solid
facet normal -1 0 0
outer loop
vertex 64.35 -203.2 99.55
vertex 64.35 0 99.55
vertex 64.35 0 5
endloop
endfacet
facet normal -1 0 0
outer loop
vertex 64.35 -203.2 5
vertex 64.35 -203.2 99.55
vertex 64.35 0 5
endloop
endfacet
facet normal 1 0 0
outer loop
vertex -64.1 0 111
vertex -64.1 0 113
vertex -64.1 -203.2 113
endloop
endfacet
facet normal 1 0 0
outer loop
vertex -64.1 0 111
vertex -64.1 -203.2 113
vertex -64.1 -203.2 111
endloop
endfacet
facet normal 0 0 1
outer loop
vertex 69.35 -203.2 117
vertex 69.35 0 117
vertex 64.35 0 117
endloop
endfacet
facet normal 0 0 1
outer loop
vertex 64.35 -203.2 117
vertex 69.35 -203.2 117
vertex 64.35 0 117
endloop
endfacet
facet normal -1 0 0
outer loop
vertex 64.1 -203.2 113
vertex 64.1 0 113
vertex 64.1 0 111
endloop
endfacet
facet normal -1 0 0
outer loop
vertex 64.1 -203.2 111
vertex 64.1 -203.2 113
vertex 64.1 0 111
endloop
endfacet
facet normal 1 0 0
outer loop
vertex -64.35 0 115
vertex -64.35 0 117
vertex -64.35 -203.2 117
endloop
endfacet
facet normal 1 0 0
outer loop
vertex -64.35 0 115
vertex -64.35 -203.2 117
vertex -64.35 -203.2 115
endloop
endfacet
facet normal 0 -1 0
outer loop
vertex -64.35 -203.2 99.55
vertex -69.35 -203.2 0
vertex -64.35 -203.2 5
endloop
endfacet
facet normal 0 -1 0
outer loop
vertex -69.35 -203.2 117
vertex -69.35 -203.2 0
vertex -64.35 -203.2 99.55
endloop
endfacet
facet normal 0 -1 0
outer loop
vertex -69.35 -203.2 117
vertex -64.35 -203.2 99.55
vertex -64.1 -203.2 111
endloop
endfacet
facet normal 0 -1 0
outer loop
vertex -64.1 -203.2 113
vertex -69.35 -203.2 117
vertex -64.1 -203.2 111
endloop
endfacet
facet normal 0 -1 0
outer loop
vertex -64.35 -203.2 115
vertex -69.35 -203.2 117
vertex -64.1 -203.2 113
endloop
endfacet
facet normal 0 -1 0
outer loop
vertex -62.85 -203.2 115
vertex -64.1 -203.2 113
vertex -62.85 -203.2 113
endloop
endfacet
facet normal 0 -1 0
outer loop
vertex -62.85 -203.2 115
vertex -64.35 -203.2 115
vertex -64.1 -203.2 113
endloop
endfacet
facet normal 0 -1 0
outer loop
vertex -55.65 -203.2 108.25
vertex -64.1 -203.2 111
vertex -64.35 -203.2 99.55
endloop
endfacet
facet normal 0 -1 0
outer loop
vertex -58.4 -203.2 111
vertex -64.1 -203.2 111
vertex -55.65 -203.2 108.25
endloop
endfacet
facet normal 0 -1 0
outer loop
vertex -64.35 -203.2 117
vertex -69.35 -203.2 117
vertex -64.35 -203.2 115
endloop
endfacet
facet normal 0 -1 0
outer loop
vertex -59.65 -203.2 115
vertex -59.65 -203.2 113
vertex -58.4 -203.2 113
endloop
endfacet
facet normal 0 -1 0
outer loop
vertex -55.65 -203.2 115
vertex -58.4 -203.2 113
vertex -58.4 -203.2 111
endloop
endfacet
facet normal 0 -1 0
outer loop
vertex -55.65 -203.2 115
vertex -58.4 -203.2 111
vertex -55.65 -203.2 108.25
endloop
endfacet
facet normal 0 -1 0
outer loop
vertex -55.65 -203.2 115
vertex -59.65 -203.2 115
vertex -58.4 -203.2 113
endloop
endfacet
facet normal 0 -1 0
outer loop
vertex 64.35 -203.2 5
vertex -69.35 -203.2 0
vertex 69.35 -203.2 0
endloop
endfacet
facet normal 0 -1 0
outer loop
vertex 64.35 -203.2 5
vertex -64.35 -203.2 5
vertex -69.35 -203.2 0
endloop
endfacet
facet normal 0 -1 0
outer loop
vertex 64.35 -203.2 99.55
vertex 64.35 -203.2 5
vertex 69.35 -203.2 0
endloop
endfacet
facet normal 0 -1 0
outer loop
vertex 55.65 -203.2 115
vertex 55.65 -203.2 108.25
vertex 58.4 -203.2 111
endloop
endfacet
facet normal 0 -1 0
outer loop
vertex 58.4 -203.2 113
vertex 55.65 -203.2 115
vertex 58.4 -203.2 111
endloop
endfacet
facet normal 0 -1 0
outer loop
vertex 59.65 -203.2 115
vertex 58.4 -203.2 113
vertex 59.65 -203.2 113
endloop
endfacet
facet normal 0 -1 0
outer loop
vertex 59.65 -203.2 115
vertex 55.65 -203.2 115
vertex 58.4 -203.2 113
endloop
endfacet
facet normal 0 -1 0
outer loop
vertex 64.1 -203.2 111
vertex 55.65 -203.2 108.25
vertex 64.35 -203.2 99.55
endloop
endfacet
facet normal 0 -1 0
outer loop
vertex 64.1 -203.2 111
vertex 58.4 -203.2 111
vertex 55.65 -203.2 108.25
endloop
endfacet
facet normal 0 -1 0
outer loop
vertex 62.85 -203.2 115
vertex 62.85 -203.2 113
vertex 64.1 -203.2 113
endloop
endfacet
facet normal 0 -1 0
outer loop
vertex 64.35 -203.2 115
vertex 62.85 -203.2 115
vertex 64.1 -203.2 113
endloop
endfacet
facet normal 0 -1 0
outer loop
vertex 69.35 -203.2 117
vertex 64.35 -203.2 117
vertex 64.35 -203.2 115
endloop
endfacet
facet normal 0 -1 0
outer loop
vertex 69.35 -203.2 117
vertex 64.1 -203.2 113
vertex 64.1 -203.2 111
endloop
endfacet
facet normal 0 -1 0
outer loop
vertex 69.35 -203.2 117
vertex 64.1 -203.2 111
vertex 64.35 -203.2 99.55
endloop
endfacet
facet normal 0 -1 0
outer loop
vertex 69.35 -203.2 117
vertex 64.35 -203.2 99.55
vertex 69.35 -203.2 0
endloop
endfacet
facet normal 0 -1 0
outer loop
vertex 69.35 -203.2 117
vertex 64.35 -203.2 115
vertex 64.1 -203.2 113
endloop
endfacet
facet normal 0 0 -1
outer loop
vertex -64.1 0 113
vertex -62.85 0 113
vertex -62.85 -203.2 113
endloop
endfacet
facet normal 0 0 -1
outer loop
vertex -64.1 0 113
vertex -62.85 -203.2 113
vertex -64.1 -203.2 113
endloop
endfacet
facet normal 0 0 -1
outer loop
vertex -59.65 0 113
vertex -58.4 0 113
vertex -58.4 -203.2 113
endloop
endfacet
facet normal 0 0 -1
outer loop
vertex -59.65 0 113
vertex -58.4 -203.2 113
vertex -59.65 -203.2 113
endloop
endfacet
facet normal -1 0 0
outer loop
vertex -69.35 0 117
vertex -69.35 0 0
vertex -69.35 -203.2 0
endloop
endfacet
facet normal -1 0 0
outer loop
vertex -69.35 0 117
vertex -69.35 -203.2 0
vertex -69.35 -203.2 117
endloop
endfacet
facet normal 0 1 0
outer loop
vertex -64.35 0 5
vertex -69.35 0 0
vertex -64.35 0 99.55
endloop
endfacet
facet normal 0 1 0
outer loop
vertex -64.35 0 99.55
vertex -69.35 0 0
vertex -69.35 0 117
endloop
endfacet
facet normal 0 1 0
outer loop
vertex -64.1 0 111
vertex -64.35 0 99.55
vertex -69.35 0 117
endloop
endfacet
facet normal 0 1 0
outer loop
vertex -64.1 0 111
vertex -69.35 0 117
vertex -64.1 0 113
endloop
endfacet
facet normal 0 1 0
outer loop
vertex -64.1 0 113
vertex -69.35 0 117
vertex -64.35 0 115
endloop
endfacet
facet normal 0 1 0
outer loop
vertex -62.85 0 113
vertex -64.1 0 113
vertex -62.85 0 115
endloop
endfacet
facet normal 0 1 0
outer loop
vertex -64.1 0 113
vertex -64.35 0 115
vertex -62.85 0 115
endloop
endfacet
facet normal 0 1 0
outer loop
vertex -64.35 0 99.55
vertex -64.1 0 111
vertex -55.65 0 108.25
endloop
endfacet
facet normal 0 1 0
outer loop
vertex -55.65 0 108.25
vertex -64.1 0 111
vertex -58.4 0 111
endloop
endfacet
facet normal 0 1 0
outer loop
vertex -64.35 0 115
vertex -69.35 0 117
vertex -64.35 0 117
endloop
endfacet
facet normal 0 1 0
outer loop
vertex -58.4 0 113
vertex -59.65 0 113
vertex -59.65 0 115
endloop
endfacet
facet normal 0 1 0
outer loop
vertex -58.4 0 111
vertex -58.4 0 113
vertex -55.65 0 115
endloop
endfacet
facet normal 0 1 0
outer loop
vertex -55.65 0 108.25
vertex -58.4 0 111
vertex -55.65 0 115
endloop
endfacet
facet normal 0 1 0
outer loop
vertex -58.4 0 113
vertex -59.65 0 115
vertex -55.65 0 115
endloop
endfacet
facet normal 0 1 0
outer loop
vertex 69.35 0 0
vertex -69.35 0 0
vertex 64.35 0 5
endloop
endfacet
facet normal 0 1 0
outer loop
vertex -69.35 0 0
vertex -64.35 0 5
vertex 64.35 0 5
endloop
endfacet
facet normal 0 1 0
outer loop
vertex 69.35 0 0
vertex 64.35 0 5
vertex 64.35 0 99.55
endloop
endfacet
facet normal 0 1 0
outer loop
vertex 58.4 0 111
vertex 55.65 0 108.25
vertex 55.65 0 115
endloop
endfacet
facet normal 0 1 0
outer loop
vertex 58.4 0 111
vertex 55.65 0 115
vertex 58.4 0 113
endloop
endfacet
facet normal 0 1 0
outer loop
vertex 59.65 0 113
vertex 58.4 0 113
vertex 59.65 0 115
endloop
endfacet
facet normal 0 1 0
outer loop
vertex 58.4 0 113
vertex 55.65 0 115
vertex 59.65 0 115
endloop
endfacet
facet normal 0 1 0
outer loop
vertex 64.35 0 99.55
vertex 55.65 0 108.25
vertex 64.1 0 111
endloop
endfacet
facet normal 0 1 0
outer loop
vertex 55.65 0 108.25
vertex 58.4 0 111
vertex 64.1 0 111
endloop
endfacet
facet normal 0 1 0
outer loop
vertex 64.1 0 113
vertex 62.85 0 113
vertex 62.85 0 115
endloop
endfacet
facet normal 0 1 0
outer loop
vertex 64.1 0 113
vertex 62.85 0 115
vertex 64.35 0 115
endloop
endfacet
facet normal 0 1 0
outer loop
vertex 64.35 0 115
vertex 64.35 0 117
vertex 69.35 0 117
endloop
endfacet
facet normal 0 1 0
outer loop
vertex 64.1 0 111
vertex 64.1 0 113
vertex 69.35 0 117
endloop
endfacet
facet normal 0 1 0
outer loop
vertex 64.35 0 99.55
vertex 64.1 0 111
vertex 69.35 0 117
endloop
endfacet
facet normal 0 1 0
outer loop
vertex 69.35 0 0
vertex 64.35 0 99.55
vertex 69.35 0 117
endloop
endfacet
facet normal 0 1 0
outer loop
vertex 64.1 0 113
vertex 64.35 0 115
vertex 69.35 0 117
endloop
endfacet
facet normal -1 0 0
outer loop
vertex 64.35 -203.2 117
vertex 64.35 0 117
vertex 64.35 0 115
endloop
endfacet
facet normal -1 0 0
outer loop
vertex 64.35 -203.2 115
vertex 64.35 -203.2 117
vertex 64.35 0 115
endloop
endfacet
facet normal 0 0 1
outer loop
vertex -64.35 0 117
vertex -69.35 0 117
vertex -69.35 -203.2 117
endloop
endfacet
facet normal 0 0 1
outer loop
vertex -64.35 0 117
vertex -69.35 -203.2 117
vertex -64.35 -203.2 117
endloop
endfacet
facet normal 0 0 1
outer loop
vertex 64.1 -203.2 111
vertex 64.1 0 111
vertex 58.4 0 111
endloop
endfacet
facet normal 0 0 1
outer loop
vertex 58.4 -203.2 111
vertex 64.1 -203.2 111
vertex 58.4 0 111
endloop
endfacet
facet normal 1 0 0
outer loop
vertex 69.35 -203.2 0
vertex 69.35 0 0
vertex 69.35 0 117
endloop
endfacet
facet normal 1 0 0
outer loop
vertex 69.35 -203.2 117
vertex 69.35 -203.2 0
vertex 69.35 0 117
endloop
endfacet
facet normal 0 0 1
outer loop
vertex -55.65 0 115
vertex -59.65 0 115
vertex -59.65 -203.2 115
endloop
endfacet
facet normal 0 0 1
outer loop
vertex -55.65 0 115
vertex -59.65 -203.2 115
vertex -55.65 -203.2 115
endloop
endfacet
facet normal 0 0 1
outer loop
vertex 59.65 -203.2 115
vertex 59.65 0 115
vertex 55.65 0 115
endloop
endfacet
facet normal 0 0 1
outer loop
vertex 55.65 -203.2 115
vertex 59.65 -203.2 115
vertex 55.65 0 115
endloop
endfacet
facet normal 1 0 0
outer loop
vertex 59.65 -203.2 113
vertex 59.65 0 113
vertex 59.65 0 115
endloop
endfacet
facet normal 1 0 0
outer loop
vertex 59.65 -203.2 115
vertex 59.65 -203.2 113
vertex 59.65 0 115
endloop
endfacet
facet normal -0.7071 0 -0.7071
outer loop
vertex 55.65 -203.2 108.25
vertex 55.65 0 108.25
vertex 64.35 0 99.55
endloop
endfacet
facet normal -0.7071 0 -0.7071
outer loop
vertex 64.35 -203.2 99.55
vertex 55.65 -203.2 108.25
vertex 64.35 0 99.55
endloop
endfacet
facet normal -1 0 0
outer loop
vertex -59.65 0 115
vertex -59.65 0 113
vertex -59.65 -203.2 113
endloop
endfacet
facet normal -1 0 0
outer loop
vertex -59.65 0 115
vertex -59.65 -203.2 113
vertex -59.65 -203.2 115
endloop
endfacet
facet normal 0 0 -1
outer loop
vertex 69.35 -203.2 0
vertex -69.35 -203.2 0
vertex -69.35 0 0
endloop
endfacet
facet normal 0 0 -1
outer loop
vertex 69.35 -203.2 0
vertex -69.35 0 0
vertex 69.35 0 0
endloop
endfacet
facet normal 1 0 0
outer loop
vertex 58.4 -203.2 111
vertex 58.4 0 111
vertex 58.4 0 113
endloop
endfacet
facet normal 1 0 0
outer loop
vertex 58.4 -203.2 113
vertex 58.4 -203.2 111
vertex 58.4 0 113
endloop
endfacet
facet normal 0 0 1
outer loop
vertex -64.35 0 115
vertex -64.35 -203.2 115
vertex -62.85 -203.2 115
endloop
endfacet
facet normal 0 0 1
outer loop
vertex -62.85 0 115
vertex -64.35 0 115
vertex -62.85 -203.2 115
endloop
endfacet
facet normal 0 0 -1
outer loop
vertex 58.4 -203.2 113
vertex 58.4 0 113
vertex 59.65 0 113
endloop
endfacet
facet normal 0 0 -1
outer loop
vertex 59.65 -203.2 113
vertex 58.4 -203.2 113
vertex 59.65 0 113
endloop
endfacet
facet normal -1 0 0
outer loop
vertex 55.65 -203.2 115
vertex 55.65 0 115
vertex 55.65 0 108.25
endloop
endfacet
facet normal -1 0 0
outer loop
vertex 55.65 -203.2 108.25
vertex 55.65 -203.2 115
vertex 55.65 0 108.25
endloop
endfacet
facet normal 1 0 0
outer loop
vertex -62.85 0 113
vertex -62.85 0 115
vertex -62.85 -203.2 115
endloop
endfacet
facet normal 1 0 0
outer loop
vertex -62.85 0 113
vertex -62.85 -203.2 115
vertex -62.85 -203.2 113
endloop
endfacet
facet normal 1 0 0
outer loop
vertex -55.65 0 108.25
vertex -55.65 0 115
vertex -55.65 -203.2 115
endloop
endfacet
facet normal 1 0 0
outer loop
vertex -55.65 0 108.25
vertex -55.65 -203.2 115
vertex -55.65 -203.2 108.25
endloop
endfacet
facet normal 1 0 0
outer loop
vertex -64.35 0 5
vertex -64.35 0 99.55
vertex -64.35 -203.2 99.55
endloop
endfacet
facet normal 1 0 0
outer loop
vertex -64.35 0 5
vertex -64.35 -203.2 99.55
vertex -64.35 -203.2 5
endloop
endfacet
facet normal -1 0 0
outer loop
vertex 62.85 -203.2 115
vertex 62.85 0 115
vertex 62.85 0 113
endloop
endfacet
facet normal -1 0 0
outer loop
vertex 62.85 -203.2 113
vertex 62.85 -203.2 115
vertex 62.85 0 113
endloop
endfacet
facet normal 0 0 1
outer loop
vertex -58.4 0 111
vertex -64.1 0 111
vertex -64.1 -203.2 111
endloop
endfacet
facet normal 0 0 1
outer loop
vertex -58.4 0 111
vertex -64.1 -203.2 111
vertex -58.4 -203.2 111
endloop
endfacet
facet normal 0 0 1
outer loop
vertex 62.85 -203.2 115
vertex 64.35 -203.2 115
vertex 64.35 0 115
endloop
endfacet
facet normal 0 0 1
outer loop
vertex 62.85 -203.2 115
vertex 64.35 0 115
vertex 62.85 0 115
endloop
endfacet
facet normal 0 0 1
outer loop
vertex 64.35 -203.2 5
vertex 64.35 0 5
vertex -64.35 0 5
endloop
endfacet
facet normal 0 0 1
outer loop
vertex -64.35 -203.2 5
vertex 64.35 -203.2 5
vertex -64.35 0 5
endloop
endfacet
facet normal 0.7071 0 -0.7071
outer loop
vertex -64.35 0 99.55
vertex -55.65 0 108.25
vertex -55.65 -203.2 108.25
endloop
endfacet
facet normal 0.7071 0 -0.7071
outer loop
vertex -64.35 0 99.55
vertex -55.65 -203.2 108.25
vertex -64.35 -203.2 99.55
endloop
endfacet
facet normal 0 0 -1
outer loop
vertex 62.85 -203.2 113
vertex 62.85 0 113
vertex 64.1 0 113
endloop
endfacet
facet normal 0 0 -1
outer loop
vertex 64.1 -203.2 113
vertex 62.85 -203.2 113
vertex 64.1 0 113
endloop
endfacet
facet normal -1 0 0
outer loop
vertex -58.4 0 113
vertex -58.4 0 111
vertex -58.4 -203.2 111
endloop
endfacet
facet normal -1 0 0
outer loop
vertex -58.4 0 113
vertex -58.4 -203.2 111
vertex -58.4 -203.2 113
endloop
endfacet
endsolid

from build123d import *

# Parameters (mm, degrees)
PAD_DEPTH = 203.2


with BuildPart() as part:
    # Sketch → Pad (new body)
    with BuildSketch(Plane.XZ):
        Polygon((-69.35, 0), (-69.35, 117), (-64.35, 117), (-64.35, 115), (-62.85, 115), (-62.85, 113), (-64.1, 113), (-64.1, 111), (-58.4, 111), (-58.4, 113), (-59.65, 113), (-59.65, 115), (-55.65, 115), (-55.65, 108.25), (-64.35, 99.55), (-64.35, 5), (0, 5), (0, 0), align=None)
    pad = extrude(amount=PAD_DEPTH)

    # Mirrored: Pad across Sketch V_Axis
    add(pad.mirror(Plane(origin=(0, 0, 0), x_dir=(0, -1, 0), z_dir=(1, 0, 0))))


solid = part.part
